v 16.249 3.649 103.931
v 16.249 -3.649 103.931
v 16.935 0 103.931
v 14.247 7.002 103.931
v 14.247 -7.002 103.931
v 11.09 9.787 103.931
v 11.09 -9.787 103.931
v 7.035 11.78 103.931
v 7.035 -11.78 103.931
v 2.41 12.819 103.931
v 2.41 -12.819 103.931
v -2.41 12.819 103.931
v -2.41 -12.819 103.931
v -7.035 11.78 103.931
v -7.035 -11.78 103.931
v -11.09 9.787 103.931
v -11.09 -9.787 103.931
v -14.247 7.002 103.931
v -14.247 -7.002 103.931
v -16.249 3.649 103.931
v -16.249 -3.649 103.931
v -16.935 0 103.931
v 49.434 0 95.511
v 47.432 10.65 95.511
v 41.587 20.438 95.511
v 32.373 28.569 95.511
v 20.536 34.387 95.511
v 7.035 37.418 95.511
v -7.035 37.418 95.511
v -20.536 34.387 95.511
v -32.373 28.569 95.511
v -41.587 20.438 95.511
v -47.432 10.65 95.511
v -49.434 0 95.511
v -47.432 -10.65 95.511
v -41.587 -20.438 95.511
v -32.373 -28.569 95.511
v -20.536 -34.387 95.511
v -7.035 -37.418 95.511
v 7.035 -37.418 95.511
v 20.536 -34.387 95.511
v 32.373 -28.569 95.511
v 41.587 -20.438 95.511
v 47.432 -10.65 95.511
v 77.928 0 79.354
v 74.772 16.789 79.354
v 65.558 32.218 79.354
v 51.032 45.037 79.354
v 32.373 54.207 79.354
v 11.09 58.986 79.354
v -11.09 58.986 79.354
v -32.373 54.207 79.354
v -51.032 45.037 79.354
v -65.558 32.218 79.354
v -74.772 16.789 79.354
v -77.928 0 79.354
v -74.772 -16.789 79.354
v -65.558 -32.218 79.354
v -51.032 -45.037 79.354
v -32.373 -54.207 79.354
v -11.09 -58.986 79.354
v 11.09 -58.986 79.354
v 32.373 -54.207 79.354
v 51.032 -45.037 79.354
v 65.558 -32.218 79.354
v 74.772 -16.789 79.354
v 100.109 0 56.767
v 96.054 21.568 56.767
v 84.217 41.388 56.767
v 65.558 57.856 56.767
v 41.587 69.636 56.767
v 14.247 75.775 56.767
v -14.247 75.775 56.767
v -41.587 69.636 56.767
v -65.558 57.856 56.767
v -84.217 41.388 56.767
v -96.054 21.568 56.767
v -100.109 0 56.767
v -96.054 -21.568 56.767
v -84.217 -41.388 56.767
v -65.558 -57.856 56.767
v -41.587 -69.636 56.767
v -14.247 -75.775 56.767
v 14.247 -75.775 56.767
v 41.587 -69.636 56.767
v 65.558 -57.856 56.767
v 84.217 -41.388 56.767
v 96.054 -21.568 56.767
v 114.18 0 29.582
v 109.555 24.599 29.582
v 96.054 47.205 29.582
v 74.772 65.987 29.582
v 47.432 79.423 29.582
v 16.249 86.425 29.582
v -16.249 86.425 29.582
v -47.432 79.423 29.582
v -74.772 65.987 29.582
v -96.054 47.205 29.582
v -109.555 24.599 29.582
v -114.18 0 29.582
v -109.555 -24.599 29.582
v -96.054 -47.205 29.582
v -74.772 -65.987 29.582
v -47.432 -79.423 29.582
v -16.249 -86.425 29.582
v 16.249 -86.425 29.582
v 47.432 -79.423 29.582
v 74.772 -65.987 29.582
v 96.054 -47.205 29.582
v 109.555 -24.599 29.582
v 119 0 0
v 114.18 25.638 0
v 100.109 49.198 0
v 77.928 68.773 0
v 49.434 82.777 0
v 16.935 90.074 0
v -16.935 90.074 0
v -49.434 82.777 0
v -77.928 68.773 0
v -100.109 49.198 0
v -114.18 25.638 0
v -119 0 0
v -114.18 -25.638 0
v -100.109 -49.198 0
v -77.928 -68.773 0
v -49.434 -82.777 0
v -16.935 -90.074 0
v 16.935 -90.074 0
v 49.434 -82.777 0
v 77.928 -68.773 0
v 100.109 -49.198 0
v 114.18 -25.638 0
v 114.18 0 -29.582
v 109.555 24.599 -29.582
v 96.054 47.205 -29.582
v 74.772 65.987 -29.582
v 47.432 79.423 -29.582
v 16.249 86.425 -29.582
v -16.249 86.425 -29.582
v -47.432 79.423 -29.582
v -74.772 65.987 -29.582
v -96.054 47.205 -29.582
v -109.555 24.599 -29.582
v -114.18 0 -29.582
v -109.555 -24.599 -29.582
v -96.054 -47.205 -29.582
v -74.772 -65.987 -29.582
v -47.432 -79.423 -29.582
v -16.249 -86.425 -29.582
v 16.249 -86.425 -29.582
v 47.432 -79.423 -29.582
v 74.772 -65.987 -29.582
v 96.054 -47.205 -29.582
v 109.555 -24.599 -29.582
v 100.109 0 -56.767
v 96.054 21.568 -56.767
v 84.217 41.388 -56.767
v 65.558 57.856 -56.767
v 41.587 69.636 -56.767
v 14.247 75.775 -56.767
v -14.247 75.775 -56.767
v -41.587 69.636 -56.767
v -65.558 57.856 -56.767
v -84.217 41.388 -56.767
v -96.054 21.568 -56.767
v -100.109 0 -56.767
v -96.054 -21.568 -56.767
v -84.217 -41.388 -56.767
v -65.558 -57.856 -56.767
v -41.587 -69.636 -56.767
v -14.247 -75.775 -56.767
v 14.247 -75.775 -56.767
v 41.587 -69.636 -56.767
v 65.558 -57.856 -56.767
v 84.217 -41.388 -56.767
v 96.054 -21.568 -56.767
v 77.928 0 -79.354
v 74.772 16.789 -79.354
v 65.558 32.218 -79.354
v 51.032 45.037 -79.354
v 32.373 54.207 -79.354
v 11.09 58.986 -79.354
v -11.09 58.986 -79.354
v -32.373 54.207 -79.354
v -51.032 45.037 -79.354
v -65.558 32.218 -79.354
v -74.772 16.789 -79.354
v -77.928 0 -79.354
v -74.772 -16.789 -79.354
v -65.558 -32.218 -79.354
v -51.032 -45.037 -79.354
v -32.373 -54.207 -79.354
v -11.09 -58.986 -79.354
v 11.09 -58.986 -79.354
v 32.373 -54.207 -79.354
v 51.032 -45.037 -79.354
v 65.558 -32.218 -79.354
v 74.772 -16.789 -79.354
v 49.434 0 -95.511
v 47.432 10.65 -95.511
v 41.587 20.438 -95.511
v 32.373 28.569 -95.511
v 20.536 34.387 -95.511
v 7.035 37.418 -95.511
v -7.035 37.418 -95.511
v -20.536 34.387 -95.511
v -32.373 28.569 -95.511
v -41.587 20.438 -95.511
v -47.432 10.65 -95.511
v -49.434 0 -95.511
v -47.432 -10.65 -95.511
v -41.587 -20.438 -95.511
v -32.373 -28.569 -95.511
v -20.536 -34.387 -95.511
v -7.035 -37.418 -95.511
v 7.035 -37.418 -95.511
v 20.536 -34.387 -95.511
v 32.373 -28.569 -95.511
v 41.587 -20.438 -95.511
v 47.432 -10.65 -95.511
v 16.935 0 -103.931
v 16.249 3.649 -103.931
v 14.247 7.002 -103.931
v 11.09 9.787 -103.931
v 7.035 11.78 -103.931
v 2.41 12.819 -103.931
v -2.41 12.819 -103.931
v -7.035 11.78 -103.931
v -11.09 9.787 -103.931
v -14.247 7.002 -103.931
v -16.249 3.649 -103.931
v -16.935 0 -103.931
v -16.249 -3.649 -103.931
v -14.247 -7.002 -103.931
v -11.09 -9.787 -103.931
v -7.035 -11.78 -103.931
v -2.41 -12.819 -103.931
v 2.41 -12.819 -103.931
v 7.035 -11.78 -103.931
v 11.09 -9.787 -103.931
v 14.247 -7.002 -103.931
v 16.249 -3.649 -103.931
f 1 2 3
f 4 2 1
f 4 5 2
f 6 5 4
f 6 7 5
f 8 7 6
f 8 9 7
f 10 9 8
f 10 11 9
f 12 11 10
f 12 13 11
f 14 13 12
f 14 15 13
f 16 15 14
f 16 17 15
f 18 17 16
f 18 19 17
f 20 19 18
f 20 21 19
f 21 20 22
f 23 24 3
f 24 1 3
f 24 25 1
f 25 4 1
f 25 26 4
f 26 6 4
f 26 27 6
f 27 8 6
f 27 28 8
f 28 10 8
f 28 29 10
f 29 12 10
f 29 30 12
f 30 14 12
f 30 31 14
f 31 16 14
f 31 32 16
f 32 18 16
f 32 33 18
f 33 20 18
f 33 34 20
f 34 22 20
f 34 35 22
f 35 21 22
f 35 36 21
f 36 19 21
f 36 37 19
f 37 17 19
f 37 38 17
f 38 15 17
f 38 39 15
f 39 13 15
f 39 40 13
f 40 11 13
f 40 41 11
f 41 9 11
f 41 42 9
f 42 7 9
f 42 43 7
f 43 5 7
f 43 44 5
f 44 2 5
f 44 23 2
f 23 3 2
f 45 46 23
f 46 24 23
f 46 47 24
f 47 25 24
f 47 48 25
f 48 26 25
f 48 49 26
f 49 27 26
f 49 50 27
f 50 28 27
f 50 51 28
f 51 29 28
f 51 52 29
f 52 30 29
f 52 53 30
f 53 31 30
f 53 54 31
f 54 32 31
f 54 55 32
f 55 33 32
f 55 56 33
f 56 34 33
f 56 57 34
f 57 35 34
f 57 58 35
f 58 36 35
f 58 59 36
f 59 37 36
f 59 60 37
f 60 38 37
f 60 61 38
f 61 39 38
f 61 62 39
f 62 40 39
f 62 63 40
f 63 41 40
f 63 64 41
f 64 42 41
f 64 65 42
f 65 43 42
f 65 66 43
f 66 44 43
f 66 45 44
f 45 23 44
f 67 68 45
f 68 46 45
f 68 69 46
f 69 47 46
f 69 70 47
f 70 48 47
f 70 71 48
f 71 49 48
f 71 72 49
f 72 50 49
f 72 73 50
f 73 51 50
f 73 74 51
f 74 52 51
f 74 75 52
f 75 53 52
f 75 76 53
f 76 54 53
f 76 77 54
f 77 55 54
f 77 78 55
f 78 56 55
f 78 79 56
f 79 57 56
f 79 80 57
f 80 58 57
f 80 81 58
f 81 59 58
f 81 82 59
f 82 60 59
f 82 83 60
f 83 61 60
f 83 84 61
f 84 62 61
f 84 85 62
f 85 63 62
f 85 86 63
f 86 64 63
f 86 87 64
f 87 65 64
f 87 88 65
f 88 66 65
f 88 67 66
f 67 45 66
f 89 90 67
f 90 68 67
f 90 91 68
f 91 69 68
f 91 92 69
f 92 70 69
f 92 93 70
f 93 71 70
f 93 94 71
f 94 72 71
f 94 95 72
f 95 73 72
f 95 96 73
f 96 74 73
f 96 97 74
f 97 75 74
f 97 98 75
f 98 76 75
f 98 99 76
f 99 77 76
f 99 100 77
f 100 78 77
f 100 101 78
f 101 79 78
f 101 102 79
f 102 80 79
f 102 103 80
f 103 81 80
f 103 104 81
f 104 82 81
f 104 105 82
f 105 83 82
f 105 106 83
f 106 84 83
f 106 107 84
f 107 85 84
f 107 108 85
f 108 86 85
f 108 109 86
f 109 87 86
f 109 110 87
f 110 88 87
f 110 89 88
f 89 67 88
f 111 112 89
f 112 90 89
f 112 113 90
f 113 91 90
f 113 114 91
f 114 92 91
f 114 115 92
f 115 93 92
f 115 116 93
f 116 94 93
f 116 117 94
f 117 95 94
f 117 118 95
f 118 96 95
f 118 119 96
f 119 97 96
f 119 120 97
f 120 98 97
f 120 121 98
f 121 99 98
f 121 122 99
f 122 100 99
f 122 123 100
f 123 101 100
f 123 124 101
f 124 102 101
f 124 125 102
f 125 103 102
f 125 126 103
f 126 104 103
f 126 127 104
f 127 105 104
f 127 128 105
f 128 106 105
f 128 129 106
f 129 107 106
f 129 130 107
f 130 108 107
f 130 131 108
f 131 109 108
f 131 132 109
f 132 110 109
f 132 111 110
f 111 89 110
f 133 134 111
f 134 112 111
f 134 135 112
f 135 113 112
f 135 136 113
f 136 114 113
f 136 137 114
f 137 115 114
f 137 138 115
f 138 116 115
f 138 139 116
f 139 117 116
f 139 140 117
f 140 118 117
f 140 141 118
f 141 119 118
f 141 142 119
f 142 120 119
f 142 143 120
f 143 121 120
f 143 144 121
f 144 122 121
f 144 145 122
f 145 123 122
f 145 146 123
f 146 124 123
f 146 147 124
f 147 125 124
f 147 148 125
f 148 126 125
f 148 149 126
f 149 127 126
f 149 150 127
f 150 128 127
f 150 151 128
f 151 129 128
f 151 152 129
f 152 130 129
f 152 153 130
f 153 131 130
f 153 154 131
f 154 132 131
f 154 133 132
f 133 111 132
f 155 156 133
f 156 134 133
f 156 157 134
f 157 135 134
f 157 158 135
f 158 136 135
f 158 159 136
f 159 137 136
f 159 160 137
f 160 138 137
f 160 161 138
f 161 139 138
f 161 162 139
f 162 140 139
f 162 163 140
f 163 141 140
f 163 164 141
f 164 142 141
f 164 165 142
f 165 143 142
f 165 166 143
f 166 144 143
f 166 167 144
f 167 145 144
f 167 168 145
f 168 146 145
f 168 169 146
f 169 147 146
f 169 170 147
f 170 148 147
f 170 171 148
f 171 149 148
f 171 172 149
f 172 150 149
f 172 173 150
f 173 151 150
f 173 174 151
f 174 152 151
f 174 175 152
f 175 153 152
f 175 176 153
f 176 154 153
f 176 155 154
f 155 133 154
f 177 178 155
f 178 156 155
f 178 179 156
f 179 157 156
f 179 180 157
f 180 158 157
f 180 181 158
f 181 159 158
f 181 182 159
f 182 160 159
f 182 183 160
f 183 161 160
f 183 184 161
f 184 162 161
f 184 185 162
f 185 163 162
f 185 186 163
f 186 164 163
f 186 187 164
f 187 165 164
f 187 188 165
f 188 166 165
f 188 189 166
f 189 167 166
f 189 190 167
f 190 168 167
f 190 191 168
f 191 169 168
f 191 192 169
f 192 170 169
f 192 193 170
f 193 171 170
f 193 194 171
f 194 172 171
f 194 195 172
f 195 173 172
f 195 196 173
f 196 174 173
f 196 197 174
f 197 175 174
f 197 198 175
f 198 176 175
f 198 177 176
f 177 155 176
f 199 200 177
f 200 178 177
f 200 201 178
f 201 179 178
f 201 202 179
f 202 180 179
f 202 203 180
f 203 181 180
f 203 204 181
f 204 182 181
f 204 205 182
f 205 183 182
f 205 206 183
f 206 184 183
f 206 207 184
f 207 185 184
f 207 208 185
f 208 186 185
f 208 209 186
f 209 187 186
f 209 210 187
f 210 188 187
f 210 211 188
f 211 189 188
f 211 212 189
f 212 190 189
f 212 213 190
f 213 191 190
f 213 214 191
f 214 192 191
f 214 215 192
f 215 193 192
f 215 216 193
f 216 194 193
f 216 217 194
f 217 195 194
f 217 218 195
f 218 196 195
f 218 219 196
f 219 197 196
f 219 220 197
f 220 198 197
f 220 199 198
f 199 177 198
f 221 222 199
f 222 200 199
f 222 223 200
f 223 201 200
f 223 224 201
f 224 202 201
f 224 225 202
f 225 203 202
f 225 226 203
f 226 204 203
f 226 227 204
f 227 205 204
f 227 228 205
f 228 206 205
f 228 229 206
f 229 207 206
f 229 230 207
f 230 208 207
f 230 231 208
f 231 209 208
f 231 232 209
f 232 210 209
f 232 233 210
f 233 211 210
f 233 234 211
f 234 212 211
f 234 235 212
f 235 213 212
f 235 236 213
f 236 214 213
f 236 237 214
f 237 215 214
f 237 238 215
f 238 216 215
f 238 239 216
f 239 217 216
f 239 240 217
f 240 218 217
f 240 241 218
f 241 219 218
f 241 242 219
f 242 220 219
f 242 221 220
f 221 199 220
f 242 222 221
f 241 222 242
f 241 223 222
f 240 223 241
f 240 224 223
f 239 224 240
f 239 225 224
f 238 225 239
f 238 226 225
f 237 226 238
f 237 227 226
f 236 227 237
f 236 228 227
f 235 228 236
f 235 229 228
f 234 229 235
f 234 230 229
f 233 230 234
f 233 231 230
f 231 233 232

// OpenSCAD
// Generated by SolidPython 1.0.1 on 2020-07-29 00:46:53


scale(v = [17, 13, 15]) {
	sphere(r = 7);
}
/***********************************************
*********      SolidPython code:      **********
************************************************
 
# import packages: SolidPython
from solid import *
from solid.utils import *
from itertools import chain, combinations, permutations


class Resize:

    def __init__(self, scad_file):
        self.scad_file = scad_file
        #self.scad_file = import_scad(scad_file)
        # cone/cylinder param:
        self.r1 = 0
        self.r2 = 0
        self.h = 0
        # rectangular prism param:
        self.w = 0
        self.l = 0
        # ellipse param:
        self.r = 0

    # import OpenScad code (file name corresponds to shape)


    # classify shape + parameters
    def assign(self, param1, param2, param3):
        if self.scad_file == 'cone.scad':
            self.r1 = param1
            self.r2 = param2
            self.h = param3
        elif self.scad_file == 'cylinder.scad':
            self.r1 = param1
            self.r2 = param2
            self.h = param3
        elif self.scad_file == 'rectangularPrism.scad':
            self.h = param1
            self.l = param2
            self.w = param3
        else:
            self.r = param1
            self.h = param2

    # resize parameters
    def iterate(self):
        x = range(3, 20, 2)
        i = 1
        if self.scad_file == 'cone.scad':
            tempList = list(permutations(x, 2))
            for temp in tempList:
                param1 = temp[0]
                param2 = temp[1]
                filepath = 'produced_scad_files/' + 'cone' + str(param1) + '_' + str(param2) + '_' + '.scad'
                scad_render_to_file(cylinder(h=param1, r1=param2, r2=0), filepath)

        elif self.scad_file == 'cylinder.scad':
            tempList = list(permutations(x, 3))
            for temp in tempList:
                param1 = temp[0]
                param2 = temp[1]
                filepath = 'produced_scad_files/' + 'cylinder' + str(param1) + '_' + str(param2) + '_' + '.scad'
                scad_render_to_file(cylinder(h=param1, r1=param2, r2=param2), filepath)

        elif self.scad_file == 'rectangularPrism.scad':
            tempList = list(permutations(x, 3))
            for temp in tempList:
                param1 = temp[0]
                param2 = temp[1]
                param3 = temp[2]
                filepath = 'produced_scad_files/' + 'rectangularPrism' + str(param1) + '_' + str(param2) + '_' + str(
                    param3) + '.scad'
                scad_render_to_file(cube(size=(param1, param2, param3)), filepath)

        elif self.scad_file == 'ellipse.scad':
            tempList = list(permutations(x, 4))
            for temp in tempList:
                param1 = temp[0]
                param2 = temp[1]
                param3 = temp[2]
                param4 = temp[3]
                filepath = 'produced_scad_files/' + 'ellipse' + str(param1) + '_' + str(param2) + '_' + str(param3) + '_' + str(param4) + '.scad'
                scad_render_to_file(scale([param1, param2, param3])(sphere(r=param4)), filepath)

    def render_to_scadfile(self):
        scad_render_to_file(scad, 'example.scad') 
 
************************************************/
